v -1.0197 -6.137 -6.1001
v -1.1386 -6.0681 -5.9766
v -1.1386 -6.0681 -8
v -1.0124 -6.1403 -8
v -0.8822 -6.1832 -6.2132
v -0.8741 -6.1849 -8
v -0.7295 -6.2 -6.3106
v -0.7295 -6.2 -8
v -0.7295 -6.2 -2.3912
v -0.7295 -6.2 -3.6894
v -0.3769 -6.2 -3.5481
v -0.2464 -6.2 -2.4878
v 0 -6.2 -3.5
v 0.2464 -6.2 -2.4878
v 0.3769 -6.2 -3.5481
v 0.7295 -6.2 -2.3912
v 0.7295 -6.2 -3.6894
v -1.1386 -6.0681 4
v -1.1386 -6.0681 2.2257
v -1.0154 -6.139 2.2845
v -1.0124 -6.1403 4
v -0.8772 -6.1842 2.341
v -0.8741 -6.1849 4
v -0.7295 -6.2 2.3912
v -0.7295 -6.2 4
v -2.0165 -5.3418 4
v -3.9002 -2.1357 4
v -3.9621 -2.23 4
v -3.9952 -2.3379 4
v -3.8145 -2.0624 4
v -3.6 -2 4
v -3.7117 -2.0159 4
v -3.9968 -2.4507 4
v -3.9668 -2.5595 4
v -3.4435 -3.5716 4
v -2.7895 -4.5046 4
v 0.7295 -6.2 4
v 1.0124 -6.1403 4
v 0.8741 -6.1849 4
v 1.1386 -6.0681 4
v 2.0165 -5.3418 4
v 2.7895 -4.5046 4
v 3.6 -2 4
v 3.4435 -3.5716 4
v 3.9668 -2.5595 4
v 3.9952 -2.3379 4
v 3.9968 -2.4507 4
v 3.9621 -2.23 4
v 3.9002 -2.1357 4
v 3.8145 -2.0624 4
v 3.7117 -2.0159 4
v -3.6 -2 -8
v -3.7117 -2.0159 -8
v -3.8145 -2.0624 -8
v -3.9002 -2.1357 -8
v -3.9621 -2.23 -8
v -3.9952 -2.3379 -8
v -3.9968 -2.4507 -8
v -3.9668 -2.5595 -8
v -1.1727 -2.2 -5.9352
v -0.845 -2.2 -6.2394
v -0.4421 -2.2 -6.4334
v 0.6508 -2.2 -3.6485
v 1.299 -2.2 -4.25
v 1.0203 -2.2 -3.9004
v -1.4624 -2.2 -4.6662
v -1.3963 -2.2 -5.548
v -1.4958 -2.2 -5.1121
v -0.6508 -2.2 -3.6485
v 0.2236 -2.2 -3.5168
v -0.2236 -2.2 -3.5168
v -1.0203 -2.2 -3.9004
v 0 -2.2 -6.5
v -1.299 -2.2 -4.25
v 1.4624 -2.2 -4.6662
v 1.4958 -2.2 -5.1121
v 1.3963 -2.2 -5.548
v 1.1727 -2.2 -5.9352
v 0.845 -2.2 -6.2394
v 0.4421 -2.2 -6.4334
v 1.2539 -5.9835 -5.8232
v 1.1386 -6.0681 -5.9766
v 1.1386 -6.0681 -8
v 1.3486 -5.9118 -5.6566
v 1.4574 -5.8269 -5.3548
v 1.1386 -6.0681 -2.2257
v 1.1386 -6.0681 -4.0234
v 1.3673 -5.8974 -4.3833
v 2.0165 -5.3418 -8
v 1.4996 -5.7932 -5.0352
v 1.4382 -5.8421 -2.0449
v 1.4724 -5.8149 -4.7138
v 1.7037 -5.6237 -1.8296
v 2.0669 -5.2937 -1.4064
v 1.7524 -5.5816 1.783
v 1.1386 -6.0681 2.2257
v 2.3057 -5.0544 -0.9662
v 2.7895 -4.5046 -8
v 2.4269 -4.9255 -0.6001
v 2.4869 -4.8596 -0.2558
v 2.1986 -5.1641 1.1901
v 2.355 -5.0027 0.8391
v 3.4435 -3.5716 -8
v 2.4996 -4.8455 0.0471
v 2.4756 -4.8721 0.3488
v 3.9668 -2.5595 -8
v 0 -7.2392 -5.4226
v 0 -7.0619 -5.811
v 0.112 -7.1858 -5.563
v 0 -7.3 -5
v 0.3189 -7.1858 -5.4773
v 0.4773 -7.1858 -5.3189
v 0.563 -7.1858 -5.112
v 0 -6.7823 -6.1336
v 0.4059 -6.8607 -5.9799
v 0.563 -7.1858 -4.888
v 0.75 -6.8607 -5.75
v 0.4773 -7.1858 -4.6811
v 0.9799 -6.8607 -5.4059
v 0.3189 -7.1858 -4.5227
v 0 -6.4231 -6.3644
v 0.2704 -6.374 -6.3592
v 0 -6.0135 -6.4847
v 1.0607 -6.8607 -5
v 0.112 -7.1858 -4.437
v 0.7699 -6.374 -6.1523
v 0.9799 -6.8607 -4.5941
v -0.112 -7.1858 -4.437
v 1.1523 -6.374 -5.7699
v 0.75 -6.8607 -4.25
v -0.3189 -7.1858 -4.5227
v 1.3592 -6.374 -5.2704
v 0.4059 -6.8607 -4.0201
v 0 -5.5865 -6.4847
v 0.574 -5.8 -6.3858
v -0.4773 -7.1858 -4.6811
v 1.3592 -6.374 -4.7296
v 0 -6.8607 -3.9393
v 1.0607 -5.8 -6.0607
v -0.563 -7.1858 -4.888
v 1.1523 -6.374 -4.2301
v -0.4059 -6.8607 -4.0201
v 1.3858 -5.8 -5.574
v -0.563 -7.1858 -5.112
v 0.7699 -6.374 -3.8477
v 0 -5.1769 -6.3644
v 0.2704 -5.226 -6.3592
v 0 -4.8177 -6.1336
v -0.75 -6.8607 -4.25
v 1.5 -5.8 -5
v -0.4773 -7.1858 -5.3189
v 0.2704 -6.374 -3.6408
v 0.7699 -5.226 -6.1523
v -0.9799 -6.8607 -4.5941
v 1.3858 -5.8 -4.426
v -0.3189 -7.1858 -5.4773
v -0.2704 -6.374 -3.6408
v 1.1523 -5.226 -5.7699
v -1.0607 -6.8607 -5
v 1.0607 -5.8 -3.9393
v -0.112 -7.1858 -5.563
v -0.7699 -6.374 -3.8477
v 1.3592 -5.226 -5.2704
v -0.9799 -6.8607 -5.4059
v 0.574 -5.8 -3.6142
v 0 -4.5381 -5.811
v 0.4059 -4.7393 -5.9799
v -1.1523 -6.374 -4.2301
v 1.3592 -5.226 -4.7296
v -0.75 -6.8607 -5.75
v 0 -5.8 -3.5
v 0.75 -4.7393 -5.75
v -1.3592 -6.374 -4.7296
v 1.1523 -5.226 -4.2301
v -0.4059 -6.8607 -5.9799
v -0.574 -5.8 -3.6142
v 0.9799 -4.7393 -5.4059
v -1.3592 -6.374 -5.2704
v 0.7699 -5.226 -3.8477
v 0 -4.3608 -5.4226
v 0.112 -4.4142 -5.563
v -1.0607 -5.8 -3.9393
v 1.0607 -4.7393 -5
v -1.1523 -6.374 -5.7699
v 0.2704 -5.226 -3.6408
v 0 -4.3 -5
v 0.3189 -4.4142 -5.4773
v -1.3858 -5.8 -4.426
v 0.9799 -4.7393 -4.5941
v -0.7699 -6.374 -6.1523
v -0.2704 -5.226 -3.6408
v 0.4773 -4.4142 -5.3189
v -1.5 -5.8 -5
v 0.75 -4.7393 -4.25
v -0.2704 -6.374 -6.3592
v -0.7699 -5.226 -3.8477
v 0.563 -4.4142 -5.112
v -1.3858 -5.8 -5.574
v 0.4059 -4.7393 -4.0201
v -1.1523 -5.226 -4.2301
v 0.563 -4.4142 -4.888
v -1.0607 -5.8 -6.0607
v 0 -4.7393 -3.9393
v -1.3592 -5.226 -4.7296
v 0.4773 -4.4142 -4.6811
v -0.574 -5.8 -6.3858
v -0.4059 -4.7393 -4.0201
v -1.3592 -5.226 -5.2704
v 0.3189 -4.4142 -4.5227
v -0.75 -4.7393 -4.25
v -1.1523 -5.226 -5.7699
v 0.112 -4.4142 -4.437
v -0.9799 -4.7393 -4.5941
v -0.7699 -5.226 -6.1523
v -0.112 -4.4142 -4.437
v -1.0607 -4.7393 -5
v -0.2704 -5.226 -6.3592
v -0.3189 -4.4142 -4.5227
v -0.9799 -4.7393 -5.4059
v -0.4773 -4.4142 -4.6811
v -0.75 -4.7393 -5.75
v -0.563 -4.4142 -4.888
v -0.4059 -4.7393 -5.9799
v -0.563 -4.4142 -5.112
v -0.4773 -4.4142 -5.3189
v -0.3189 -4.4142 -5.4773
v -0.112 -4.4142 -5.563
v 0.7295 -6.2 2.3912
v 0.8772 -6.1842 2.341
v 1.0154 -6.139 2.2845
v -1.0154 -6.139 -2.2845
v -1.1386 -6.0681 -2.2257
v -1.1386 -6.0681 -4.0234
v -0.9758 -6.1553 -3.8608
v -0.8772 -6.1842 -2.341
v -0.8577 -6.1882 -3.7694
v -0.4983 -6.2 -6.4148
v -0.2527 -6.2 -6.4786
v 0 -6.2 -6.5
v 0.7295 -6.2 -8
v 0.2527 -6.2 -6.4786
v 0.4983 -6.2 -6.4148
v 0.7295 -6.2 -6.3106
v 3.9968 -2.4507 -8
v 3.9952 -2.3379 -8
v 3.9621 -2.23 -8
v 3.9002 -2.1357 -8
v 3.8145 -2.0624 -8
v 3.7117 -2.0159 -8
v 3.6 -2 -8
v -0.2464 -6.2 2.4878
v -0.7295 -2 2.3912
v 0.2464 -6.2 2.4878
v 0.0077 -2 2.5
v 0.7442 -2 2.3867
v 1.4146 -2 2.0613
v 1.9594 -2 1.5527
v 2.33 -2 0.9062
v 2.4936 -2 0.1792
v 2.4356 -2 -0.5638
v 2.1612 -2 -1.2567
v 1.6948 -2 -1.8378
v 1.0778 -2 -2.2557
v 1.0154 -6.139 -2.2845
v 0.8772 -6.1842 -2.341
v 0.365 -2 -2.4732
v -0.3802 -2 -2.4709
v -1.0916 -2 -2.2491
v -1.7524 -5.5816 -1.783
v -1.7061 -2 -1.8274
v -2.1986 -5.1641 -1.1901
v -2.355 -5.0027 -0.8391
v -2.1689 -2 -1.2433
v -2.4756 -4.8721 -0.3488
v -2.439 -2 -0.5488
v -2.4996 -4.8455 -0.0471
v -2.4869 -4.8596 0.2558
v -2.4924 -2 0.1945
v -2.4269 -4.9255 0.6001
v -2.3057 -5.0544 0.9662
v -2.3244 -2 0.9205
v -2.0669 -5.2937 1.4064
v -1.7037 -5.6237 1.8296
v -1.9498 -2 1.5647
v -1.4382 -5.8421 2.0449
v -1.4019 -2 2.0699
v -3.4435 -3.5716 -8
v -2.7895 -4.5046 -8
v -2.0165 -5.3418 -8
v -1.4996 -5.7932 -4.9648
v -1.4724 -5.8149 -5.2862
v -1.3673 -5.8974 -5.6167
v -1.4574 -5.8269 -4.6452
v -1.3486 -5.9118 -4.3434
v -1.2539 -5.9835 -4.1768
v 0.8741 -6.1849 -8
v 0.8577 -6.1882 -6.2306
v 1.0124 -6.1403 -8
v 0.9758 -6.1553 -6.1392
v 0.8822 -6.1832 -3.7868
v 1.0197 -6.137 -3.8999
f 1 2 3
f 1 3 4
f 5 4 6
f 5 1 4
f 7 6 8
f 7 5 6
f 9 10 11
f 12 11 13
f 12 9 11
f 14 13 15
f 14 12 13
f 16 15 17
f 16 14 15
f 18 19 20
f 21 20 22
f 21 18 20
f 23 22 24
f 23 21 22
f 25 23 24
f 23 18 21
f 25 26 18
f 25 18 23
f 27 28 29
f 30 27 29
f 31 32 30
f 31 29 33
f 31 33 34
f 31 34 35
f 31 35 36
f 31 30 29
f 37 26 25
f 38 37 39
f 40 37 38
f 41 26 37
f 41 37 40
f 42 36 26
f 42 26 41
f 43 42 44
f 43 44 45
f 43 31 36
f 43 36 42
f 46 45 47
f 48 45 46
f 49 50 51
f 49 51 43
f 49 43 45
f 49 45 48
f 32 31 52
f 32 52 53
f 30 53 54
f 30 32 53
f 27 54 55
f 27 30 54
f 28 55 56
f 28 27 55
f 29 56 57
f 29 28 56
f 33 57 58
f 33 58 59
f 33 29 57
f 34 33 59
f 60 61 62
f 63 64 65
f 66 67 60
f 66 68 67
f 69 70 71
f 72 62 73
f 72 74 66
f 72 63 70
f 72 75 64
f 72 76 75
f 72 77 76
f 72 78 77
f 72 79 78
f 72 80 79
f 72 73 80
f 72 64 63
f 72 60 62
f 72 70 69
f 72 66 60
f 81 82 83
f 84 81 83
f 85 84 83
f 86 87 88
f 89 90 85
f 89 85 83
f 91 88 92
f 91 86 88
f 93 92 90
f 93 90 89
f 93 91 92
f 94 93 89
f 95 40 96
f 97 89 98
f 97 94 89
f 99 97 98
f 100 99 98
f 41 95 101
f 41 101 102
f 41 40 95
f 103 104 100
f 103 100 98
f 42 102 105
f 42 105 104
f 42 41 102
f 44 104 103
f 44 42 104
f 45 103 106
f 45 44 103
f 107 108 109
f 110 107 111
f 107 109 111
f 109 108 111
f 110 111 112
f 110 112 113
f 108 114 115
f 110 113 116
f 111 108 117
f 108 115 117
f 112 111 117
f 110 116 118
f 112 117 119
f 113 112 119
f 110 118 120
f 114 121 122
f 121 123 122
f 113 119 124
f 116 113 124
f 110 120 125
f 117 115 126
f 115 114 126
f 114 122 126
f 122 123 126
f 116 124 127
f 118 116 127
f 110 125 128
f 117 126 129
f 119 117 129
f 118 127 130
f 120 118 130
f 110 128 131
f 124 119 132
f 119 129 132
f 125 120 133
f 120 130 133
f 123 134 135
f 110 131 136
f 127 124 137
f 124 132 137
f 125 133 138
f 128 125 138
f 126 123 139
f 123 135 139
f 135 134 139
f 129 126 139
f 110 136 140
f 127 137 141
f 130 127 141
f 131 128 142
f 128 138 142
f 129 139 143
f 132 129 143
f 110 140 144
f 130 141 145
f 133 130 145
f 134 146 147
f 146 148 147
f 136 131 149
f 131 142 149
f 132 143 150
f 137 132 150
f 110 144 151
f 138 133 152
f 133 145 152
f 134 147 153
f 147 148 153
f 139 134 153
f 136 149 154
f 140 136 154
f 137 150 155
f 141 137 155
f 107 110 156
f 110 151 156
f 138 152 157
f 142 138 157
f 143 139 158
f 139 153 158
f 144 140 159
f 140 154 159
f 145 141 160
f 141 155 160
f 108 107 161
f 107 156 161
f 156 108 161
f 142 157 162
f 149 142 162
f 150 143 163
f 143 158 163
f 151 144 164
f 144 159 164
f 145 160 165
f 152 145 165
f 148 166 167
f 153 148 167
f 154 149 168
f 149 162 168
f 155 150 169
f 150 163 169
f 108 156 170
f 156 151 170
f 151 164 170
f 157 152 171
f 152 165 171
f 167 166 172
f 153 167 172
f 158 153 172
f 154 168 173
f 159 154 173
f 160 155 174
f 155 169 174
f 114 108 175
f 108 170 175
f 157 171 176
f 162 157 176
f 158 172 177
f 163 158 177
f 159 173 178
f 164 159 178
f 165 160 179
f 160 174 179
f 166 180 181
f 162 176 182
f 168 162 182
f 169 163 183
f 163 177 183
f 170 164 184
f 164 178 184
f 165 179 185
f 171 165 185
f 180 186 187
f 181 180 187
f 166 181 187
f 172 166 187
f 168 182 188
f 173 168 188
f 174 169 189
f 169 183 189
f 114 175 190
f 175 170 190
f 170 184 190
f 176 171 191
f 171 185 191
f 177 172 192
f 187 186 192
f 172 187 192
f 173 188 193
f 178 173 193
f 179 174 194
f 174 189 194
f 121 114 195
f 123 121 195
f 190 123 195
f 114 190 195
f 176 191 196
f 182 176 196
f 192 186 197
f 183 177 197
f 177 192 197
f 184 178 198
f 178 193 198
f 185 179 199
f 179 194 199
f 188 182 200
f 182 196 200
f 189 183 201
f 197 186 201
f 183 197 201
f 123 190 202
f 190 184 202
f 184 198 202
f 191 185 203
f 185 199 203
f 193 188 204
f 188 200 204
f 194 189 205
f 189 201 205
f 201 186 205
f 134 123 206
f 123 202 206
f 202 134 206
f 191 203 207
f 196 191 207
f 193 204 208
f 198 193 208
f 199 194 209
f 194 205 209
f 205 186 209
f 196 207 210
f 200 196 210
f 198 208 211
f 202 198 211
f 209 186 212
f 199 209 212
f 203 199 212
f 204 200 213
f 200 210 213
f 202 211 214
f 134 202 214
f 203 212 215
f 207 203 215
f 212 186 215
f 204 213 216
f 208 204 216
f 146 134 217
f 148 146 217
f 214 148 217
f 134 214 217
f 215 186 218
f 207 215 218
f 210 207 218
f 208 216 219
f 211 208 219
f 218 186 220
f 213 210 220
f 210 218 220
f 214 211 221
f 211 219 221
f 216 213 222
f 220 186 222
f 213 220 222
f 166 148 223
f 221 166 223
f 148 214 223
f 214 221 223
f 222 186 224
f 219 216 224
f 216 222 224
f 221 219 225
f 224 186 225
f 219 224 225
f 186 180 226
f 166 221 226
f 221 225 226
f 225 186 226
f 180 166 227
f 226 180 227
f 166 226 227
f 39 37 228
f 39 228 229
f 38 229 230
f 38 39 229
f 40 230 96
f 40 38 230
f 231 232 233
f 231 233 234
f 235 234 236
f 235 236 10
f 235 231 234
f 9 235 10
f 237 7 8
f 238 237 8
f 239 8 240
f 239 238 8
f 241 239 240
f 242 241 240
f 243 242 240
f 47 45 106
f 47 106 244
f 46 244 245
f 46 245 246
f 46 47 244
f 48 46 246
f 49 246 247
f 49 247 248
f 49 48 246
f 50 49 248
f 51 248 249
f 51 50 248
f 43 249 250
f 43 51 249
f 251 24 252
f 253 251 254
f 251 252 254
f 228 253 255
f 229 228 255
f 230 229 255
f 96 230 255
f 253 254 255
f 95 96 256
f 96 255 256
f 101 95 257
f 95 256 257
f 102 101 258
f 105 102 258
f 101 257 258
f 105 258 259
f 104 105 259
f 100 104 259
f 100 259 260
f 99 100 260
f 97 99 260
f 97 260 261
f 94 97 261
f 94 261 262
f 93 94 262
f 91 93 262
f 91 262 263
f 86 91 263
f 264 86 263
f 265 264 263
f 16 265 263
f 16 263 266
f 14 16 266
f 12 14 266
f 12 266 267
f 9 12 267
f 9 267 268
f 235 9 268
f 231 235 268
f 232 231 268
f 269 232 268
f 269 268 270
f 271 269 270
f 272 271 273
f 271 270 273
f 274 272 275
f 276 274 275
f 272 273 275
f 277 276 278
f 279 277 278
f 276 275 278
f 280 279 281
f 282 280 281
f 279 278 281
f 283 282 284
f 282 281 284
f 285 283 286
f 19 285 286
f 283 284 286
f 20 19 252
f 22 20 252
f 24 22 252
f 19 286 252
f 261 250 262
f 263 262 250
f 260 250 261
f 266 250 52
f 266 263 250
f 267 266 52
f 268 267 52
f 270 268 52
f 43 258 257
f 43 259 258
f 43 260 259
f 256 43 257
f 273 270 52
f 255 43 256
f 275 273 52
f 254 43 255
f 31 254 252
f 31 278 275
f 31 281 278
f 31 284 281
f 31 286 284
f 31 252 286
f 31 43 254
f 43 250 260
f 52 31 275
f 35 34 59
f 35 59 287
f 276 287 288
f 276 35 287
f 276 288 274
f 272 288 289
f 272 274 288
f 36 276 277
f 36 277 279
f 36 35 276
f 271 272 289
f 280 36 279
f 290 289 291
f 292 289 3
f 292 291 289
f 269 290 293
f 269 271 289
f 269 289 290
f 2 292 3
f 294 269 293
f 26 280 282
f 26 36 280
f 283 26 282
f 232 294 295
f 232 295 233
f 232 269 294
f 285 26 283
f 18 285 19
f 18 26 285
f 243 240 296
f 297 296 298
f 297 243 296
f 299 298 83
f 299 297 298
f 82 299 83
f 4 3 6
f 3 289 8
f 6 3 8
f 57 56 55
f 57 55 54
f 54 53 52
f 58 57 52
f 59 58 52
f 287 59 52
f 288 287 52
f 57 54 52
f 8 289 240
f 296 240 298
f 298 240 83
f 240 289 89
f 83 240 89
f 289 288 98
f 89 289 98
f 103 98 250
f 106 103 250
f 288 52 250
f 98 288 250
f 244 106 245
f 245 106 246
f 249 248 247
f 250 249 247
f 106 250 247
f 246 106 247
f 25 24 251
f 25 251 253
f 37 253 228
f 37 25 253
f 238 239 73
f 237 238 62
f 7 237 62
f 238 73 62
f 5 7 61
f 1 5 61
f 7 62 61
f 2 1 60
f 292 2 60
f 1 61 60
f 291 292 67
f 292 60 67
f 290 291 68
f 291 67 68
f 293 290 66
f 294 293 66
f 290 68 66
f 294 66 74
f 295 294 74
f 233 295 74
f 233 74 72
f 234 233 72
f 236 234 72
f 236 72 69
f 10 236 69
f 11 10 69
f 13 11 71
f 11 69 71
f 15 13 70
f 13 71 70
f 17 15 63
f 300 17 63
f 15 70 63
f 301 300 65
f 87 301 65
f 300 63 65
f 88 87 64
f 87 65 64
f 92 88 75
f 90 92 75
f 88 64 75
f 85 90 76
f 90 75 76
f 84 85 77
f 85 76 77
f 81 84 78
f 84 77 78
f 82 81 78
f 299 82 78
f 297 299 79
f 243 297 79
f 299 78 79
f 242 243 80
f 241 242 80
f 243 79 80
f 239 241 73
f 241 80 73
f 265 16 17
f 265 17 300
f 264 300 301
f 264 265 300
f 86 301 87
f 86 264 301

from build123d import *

# Parameters (mm, degrees)
SKETCH1_R              = 2.5
BOSS_EXTRUDE1_DEPTH    = 8
CUT_SWEEP1_PITCH       = 0.7999999999999955
CUT_SWEEP1_HEIGHT      = 8.799999999999976
CUT_SWEEP1_RADIUS      = 2.5000000000000004
CUT_SWEEP1_START_ANGLE = -179.99999999999997
SKETCH4_OUTSIDE_W      = 10.736
SKETCH4_OUTSIDE_H      = 10.736
SKETCH4_OUTSIDE_R      = 1.8937822173508914
CUT_EXTRUDE1_DEPTH     = 0.8
CUT_EXTRUDE1_DRAFT     = -45.0000000000001
CUT_EXTRUDE2_DEPTH     = 1.8
BOSS_EXTRUDE2_START    = 4
BOSS_EXTRUDE2_DEPTH    = 12
SKETCH9_R              = 2.5
CUT_EXTRUDE4_DEPTH     = 13.270391295716696
SKETCH10_W             = 1.5
SKETCH10_H             = 3.9999999999999996


with BuildPart() as part:
    # Sketch1 → Boss-Extrude1 (new body)
    with BuildSketch(Plane(origin=(0, 0, 0), x_dir=(1, 0, 0), z_dir=(0, 1, 0))):
        with Locations(Location((0, 0, 0), (0, 0, 270))):
            Circle(SKETCH1_R)
    extrude(amount=-BOSS_EXTRUDE1_DEPTH)

    # Cut-Sweep1: sweep along a helix
    with BuildLine() as cut_sweep1_path:
        add(Helix(CUT_SWEEP1_PITCH, CUT_SWEEP1_HEIGHT, CUT_SWEEP1_RADIUS, center=(0, -8.000000000000002, 0), direction=(0, 1, 0), mode=Mode.PRIVATE).rotate(Axis((0, -8.000000000000002, 0), (0, 1, 0)), CUT_SWEEP1_START_ANGLE))
    # Sketch3 → Cut-Sweep1 (sweep, cut)
    with BuildSketch(Plane(origin=(0, 0, 0), x_dir=(0, 0, -1), z_dir=(1, 0, 0))):
        Polygon((1.9803847577293245, -8.300000000000004), (2.543301270189217, -7.975000000000005), (2.543301270189217, -8.725000000000001), (1.9803847577293245, -8.400000000000002), align=None)
    sweep(path=cut_sweep1_path.line, is_frenet=True, mode=Mode.SUBTRACT)


with BuildPart() as cut_extrude1_tool:
    # Sketch4 outside → Cut-Extrude1 (with draft: the straight prism first)
    with BuildSketch(Plane.XZ.offset(8)):
        Rectangle(SKETCH4_OUTSIDE_W, SKETCH4_OUTSIDE_H)
        Circle(SKETCH4_OUTSIDE_R, mode=Mode.SUBTRACT)
    extrude(amount=-CUT_EXTRUDE1_DEPTH)
    # Cut-Extrude1: the draft: its side faces are tilted about the plane it starts from
    cut_extrude1_sides = [cut_extrude1_tool.faces().sort_by_distance(p)[0] for p in [
        (0, -7.6, -5.368),
        (5.368, -7.6, 0),
        (0, -7.6, 5.368),
        (-5.368, -7.6, 0),
        (-1.893782217, -7.6, 0),
    ]]
    draft(cut_extrude1_sides, Plane.XZ.offset(8), CUT_EXTRUDE1_DRAFT)


with BuildPart() as part_1:
    add(part.part)

    # Cut-Extrude1: cut by cut_extrude1_tool
    add(cut_extrude1_tool.part, mode=Mode.SUBTRACT)

    # Sketch5 → Revolve1 (revolve)
    with BuildSketch(Plane.XY, mode=Mode.PRIVATE) as revolve1_sk:
        with BuildLine():
            Line((6e-17, 2.8), (0, 0))
            Line((0, 0), (-4.75, -5.6e-16))
            Line((-4.75, -5.6e-16), (-4.75, 0.6999999999999993))
            ThreePointArc((-4.75, 0.6999999999999993), (-3.774006491780319, 1.9096498126217711), (-2.5, 2.7999999999999994))
            Line((-2.5, 2.7999999999999994), (6e-17, 2.8))
        make_face()
    revolve(revolve1_sk.sketch.rotate(Axis((0, 0, 0), (1.2e-16, -1, 0)), 90), axis=Axis((0, 0, 0), (1.2e-16, -1, 0)))

    # Sketch6 → Cut-Extrude2 (cut)
    with BuildSketch(Plane(origin=(-3.5e-16, 2.8000000000000003, 0), x_dir=(1, 1.2e-16, 0), z_dir=(-1.2e-16, 1, 0))):
        Polygon((0, 1.7320508075688774), (-1.5000000000000004, 0.8660254037844389), (-1.5000000000000002, -0.866025403784439), (3e-17, -1.7320508075688779), (1.5, -0.8660254037844396), (1.4999999999999998, 0.8660254037844392), align=None)
    extrude(amount=-CUT_EXTRUDE2_DEPTH, mode=Mode.SUBTRACT)

    # Cut-Extrude3 cone 1 section (through the dimple's axis) → Cut-Extrude3 (revolve, cut)
    with BuildSketch(Plane(origin=(0, 2.8, 0), x_dir=(0, 0, 1), z_dir=(1, 0, 0))):
        Polygon((0, 0), (1.732050808, 0), (0, 1.732050808), align=None)
    revolve(axis=Axis((0, 2.8, 0), (0, -1, 0)), mode=Mode.SUBTRACT)


with BuildPart() as body_2:
    # Sketch8 → Boss-Extrude2 (new body)
    with BuildSketch(Plane.XY.offset(BOSS_EXTRUDE2_START)):
        with BuildLine():
            Line((-0.729539694732655, -6.200000000000001), (0.7295396947326566, -6.200000000000001))
            ThreePointArc((0.7295396947326566, -6.200000000000001), (0.9444293615952137, -6.166199993302087), (1.1385668222312952, -6.068064088787715))
            ThreePointArc((1.1385668222312952, -6.068064088787715), (2.7894535956378506, -4.5046324857998545), (3.9668242545450783, -2.559499110585124))
            ThreePointArc((3.9668242545450783, -2.559499110585124), (3.934514307791197, -2.180682472467487), (3.6, -1.9999999999999996))
            Line((3.6, -1.9999999999999996), (-3.599999999999999, -2.0000000000000004))
            ThreePointArc((-3.599999999999999, -2.0000000000000004), (-3.934514307791197, -2.1806824724674874), (-3.9668242545450783, -2.559499110585125))
            ThreePointArc((-3.9668242545450783, -2.559499110585125), (-2.789453595637847, -4.504632485799857), (-1.1385668222312935, -6.068064088787715))
            ThreePointArc((-1.1385668222312935, -6.068064088787715), (-0.9444293615952122, -6.166199993302087), (-0.729539694732655, -6.200000000000001))
        make_face()
    extrude(amount=-BOSS_EXTRUDE2_DEPTH)

    # Sketch9 → Cut-Extrude4 (cut, through all)
    with BuildSketch(Plane(origin=(0, 0, 0), x_dir=(1, 0, 0), z_dir=(0, 1, 0))):
        with Locations(Location((0, 0, 0), (0, 0, 253.033298699))):
            Circle(SKETCH9_R)
    extrude(amount=-CUT_EXTRUDE4_DEPTH, mode=Mode.SUBTRACT)

    # Sketch10 → Cut-Revolve1 (revolve, cut)
    with BuildSketch(Plane(origin=(0, 0, 0), x_dir=(0, 0, -1), z_dir=(1, 0, 0))):
        with Locations((5.750000000000001, -4.2)):
            Rectangle(SKETCH10_W, SKETCH10_H)
    revolve(axis=Axis((0, -2.2000000000000006, -5.000000000000001), (0, 1, 0)), mode=Mode.SUBTRACT)


with BuildPart() as body_3:
    # Sketch11 → Revolve2 (revolve)
    with BuildSketch(Plane(origin=(0, 0, 0), x_dir=(0, 0, -1), z_dir=(1, 0, 0))):
        with BuildLine():
            Line((5.000000000000001, -4.300000000000002), (5.000000000000001, -7.300000000000001))
            ThreePointArc((5.000000000000001, -7.300000000000001), (6.500000000000001, -5.800000000000001), (5.000000000000001, -4.300000000000002))
        make_face()
    revolve(axis=Axis((0, -4.300000000000002, -5.000000000000001), (0, -1, 0)))


solid = Compound([body_2.part, body_3.part])
